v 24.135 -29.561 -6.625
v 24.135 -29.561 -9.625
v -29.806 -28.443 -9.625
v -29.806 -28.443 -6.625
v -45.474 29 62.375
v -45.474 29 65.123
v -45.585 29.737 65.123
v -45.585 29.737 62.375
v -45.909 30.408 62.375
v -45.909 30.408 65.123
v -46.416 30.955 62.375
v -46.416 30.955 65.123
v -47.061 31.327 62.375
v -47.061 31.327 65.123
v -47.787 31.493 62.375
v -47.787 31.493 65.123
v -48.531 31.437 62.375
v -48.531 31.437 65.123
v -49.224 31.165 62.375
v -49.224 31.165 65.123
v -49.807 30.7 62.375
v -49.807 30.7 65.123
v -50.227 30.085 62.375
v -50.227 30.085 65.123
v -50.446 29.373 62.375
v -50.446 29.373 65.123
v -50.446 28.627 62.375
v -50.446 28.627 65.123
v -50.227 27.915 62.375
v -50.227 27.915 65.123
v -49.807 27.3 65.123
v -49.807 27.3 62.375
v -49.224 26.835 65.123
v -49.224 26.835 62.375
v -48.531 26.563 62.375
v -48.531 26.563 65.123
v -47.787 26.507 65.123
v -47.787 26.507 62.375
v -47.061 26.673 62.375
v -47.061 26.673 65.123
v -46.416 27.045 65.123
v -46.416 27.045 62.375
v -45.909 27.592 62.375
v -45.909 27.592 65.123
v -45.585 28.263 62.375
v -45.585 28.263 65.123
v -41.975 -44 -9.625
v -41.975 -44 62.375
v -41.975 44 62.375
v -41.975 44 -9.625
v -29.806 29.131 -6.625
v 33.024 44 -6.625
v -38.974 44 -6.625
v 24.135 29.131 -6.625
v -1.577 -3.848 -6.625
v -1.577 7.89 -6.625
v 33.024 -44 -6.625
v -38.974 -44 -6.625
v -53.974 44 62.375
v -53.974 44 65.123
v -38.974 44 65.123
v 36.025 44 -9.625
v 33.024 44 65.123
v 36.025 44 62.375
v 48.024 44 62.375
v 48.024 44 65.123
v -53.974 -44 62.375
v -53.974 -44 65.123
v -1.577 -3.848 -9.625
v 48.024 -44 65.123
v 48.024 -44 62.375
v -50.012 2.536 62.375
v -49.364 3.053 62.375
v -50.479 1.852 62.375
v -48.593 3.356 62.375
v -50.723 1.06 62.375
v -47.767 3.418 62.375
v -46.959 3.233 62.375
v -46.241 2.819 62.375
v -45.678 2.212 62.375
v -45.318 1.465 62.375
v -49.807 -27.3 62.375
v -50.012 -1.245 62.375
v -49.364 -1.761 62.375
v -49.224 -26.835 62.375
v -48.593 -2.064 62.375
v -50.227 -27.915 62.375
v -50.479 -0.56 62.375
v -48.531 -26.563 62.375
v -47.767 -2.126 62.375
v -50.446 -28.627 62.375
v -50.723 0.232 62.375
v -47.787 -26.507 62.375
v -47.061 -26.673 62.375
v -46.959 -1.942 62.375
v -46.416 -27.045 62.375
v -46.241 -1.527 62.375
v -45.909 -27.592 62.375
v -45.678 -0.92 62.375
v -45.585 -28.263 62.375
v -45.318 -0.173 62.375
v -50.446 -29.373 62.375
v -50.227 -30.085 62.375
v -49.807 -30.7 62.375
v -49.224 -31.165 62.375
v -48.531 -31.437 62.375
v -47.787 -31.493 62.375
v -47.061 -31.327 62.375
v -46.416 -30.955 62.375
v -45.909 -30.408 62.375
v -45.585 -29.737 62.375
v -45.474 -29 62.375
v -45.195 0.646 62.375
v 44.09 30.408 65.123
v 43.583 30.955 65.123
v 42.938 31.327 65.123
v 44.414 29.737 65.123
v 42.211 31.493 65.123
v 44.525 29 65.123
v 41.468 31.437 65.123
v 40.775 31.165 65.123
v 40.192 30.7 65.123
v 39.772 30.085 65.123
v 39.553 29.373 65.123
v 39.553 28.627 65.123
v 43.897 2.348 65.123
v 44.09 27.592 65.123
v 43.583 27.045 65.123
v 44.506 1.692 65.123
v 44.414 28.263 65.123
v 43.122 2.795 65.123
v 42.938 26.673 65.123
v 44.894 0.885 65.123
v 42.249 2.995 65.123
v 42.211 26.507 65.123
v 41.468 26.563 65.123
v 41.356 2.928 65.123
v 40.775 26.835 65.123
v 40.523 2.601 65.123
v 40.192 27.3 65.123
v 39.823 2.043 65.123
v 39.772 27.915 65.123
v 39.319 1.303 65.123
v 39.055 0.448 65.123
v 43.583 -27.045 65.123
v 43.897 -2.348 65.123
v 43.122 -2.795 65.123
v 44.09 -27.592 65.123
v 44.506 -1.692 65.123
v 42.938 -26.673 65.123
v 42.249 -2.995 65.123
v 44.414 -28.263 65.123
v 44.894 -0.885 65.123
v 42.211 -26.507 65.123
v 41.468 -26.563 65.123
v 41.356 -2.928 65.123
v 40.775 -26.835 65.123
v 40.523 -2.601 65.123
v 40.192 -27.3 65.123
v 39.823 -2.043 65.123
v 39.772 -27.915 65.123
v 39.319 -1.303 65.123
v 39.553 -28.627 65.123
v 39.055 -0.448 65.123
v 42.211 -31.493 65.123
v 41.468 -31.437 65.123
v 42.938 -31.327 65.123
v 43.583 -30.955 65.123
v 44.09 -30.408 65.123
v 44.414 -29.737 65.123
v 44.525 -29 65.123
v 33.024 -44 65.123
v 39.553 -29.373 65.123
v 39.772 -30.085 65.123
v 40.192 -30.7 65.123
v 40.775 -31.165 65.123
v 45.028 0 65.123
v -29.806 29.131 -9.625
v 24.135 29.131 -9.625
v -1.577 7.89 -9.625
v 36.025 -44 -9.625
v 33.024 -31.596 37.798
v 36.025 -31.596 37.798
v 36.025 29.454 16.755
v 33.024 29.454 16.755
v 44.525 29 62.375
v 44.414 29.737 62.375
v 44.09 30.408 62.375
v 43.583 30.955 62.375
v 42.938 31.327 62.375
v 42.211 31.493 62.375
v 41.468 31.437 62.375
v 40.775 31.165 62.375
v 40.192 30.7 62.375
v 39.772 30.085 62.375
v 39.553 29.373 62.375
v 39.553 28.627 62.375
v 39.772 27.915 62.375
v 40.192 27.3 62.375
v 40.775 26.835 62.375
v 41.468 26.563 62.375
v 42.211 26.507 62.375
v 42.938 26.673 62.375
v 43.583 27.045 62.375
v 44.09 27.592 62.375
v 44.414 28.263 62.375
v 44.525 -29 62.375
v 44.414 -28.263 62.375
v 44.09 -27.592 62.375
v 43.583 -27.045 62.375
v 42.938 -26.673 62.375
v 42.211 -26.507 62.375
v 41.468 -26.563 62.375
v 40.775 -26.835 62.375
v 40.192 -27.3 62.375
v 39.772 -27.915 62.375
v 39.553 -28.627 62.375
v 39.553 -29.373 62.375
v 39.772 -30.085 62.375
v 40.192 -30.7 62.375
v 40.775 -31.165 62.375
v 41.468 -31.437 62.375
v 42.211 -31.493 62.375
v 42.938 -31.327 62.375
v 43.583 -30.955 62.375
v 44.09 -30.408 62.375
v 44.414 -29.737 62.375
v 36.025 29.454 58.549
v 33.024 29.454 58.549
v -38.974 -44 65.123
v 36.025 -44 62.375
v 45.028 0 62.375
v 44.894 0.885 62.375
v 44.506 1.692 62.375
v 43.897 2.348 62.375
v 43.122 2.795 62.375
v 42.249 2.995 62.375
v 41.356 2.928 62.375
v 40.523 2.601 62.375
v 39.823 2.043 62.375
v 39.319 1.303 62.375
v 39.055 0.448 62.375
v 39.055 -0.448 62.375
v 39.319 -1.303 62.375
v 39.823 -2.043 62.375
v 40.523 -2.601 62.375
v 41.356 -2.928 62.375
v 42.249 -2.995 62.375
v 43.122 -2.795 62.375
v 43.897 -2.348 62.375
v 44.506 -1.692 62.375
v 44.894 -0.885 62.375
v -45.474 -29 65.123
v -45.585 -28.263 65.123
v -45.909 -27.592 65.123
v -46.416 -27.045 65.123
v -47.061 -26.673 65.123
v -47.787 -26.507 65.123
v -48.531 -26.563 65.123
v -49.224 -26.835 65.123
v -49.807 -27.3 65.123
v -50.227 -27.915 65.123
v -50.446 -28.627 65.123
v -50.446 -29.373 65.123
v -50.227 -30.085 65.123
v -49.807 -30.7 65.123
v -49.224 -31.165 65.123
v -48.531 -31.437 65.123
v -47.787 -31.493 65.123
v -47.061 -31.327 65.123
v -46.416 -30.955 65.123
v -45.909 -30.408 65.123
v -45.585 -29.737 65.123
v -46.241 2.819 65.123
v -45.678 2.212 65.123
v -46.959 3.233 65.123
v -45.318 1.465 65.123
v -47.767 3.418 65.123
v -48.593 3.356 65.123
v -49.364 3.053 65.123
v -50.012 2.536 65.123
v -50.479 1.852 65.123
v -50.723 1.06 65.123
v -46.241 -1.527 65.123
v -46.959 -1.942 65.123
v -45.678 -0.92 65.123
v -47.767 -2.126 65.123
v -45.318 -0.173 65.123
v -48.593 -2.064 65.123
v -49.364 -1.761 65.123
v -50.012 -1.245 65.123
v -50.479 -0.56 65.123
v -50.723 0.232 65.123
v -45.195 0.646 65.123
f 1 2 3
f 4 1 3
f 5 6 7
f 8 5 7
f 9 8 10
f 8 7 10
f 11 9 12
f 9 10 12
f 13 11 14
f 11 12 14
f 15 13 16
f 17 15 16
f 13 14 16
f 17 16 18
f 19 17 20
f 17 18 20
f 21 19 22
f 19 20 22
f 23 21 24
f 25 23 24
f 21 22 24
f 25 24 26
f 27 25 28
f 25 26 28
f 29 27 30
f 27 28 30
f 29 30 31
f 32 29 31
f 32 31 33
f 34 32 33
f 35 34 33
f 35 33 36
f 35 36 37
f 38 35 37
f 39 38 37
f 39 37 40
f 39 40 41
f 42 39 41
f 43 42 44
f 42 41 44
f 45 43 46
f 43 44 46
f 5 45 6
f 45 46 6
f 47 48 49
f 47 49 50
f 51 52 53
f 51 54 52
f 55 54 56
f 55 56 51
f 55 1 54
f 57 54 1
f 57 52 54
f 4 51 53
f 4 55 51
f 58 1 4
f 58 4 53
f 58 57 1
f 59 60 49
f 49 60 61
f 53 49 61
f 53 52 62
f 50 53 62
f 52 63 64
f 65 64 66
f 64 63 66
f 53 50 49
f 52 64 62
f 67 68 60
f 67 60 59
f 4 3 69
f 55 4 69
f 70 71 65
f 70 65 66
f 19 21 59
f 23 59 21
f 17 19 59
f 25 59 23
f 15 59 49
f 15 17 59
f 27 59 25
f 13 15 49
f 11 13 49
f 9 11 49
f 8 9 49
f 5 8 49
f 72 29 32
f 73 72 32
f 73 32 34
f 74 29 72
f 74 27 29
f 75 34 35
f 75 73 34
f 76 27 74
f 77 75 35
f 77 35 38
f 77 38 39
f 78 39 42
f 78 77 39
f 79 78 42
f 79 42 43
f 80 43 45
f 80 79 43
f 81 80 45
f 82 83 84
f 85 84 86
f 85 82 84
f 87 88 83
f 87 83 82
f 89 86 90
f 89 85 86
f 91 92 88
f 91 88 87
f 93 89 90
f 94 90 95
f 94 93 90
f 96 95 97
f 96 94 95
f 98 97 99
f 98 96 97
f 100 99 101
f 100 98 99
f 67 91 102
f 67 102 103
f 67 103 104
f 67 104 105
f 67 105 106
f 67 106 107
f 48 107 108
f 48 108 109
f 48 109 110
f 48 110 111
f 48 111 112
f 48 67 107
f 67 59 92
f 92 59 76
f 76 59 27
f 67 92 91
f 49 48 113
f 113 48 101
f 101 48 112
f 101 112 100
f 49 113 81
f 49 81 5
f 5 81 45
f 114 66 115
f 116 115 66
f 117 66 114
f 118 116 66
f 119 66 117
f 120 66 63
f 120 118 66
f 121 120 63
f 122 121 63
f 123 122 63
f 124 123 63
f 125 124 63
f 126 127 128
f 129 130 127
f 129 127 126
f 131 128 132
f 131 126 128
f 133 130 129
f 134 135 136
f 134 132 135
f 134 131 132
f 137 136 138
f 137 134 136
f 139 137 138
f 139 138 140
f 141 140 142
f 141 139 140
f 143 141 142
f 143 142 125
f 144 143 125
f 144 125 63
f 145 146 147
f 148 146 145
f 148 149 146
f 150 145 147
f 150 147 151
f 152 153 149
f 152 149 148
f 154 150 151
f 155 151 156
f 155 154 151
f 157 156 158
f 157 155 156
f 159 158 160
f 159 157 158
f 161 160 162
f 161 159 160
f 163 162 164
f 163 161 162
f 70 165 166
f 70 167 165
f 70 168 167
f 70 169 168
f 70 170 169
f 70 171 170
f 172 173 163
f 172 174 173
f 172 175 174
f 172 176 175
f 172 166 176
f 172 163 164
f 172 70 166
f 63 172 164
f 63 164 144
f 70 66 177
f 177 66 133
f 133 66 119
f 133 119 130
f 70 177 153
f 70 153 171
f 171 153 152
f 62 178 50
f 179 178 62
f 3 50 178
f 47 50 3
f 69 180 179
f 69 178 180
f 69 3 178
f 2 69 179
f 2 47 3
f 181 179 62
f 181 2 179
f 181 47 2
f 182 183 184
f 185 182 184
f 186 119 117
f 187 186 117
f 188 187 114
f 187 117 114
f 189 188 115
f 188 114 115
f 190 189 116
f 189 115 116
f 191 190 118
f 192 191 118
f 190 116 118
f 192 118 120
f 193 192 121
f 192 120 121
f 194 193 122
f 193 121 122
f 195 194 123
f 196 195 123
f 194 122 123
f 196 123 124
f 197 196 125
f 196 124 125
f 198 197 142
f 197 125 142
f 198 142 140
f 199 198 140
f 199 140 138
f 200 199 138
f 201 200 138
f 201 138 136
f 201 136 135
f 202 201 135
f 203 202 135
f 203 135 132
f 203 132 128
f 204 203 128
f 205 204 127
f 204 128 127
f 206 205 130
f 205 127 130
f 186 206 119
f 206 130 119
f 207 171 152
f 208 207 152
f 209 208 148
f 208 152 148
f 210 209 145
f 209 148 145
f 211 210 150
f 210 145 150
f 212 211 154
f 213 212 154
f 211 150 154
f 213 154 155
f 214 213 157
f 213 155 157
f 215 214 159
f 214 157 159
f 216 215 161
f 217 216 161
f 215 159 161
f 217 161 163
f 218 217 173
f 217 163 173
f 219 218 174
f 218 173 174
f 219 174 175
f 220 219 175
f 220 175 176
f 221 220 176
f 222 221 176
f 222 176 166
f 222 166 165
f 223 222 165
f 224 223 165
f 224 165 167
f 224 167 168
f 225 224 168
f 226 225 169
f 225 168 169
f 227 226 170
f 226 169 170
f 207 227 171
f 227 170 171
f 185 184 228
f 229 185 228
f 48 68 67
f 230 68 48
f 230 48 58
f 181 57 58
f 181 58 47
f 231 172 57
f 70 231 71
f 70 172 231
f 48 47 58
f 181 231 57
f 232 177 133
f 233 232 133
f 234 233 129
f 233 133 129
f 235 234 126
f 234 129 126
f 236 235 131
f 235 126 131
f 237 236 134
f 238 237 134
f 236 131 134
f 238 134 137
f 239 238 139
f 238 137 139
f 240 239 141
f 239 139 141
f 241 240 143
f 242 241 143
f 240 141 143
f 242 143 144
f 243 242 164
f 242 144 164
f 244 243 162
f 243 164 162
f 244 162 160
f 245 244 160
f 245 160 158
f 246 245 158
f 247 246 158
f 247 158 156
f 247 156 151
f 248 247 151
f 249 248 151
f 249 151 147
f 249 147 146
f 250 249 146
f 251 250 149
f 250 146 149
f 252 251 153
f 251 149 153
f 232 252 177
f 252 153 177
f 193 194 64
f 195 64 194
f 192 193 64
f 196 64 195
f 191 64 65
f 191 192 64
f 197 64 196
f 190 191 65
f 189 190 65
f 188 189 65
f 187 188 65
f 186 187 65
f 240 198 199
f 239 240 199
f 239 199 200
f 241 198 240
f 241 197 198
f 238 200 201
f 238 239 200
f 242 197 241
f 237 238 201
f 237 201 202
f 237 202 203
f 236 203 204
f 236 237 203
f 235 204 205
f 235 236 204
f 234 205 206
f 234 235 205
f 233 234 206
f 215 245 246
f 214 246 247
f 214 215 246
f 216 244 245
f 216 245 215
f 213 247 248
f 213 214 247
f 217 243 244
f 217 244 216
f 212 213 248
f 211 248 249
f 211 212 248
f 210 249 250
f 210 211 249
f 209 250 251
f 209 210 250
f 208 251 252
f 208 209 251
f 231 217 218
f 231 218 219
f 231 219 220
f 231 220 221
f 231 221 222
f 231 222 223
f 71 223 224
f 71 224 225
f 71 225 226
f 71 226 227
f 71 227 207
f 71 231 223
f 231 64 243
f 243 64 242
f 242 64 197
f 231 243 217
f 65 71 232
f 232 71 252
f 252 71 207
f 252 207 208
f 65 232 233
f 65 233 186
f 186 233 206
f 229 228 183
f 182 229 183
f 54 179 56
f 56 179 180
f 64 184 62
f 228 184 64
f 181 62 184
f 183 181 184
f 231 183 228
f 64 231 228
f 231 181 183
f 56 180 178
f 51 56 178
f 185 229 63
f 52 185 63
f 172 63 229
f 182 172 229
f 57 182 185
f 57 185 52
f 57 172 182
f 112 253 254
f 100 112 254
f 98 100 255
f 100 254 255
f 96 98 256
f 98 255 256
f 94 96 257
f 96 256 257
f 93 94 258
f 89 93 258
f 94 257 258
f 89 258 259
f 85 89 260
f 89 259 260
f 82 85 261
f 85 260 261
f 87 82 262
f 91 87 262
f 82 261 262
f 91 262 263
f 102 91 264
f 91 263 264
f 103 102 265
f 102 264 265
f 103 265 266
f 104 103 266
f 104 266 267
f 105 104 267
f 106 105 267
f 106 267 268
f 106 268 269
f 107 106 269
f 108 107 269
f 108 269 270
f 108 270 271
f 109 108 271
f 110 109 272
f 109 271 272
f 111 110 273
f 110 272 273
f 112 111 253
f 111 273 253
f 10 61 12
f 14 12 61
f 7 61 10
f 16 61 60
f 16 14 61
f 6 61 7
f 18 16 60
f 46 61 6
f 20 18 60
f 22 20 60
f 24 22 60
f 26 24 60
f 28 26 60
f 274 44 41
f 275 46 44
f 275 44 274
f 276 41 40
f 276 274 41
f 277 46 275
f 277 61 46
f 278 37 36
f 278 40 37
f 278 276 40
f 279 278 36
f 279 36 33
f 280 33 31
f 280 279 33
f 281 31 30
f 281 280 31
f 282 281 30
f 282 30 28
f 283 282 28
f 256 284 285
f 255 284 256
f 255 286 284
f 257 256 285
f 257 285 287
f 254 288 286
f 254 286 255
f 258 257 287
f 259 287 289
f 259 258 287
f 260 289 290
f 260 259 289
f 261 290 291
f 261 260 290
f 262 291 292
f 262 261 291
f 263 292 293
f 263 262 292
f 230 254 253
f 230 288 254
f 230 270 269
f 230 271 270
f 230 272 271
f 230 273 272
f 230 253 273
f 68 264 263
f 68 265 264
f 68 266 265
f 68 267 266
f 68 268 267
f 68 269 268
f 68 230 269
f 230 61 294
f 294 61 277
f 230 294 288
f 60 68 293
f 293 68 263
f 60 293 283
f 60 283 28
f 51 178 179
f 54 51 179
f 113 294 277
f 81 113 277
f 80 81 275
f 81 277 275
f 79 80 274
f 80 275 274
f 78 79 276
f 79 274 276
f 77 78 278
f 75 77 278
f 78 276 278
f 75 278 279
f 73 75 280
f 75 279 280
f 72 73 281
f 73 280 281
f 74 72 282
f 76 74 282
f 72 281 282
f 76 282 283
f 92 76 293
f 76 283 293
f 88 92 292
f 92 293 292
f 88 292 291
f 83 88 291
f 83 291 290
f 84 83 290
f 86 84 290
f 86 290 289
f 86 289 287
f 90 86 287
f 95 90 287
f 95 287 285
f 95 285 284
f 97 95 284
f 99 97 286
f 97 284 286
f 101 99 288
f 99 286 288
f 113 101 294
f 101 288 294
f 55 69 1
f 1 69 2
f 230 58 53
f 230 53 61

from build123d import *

# Parameters (mm, degrees)
F1_DEPTH = 44
F2_R     = 2.5
F2_R_2   = 2.779494
F2_R_3   = 3.003014
F3_DEPTH = 2.748387
F5_DEPTH = 4
F7_DEPTH = 4


with BuildPart() as f1:
    # F0 (on Front) → F1 (new body, symmetric)
    with BuildSketch(Plane.XZ):
        Polygon((33.024074, -6.624926), (-2.974825, -6.624926), (-2.974825, -9.624926), (36.025175, -9.624926), (36.025175, 62.375074), (48.024074, 62.375074), (48.024074, 65.123461), (33.024074, 65.123461), align=None)
        Polygon((-2.974825, -9.624926), (-2.974825, -6.624926), (-38.973723, -6.624926), (-38.973723, 65.123461), (-53.973723, 65.123461), (-53.973723, 62.375074), (-41.974825, 62.375074), (-41.974825, -9.624926), align=None)
    extrude(amount=F1_DEPTH, both=True)

    # F2 (on face) → F3 (cut, through all)
    with BuildSketch(Plane.XY.offset(65.123461)):
        with Locations((42.024624, -29)):
            Circle(F2_R)
        with Locations((42.024624, 29)):
            Circle(F2_R)
        with Locations((-47.974274, 29)):
            Circle(F2_R)
        with Locations((-47.974274, -29)):
            Circle(F2_R)
        with Locations((-47.974274, 0.645779)):
            Circle(F2_R_2)
        with Locations((42.024624, 0)):
            Circle(F2_R_3)
    extrude(amount=-F3_DEPTH, mode=Mode.SUBTRACT)

    # F4 (on face) → F5 (cut)
    with BuildSketch(Plane(origin=(0, 0, -9.624926), x_dir=(1, 0, 0), z_dir=(0, 0, -1))):
        Polygon((-1.577392, 3.848274), (24.135478, 29.56114), (-29.805643, 28.443189), align=None)
        Polygon((24.135478, -29.131273), (-1.577392, -7.890209), (-29.805643, -29.131273), align=None)
    extrude(amount=-F5_DEPTH, mode=Mode.SUBTRACT)

    # F6 (on face) → F7 (cut)
    with BuildSketch(Plane.YZ.offset(36.025175)):
        Polygon((29.453758, 16.755113), (29.453758, 58.549069), (-31.596411, 37.797935), align=None)
    extrude(amount=-F7_DEPTH, mode=Mode.SUBTRACT)


solid = f1.part
